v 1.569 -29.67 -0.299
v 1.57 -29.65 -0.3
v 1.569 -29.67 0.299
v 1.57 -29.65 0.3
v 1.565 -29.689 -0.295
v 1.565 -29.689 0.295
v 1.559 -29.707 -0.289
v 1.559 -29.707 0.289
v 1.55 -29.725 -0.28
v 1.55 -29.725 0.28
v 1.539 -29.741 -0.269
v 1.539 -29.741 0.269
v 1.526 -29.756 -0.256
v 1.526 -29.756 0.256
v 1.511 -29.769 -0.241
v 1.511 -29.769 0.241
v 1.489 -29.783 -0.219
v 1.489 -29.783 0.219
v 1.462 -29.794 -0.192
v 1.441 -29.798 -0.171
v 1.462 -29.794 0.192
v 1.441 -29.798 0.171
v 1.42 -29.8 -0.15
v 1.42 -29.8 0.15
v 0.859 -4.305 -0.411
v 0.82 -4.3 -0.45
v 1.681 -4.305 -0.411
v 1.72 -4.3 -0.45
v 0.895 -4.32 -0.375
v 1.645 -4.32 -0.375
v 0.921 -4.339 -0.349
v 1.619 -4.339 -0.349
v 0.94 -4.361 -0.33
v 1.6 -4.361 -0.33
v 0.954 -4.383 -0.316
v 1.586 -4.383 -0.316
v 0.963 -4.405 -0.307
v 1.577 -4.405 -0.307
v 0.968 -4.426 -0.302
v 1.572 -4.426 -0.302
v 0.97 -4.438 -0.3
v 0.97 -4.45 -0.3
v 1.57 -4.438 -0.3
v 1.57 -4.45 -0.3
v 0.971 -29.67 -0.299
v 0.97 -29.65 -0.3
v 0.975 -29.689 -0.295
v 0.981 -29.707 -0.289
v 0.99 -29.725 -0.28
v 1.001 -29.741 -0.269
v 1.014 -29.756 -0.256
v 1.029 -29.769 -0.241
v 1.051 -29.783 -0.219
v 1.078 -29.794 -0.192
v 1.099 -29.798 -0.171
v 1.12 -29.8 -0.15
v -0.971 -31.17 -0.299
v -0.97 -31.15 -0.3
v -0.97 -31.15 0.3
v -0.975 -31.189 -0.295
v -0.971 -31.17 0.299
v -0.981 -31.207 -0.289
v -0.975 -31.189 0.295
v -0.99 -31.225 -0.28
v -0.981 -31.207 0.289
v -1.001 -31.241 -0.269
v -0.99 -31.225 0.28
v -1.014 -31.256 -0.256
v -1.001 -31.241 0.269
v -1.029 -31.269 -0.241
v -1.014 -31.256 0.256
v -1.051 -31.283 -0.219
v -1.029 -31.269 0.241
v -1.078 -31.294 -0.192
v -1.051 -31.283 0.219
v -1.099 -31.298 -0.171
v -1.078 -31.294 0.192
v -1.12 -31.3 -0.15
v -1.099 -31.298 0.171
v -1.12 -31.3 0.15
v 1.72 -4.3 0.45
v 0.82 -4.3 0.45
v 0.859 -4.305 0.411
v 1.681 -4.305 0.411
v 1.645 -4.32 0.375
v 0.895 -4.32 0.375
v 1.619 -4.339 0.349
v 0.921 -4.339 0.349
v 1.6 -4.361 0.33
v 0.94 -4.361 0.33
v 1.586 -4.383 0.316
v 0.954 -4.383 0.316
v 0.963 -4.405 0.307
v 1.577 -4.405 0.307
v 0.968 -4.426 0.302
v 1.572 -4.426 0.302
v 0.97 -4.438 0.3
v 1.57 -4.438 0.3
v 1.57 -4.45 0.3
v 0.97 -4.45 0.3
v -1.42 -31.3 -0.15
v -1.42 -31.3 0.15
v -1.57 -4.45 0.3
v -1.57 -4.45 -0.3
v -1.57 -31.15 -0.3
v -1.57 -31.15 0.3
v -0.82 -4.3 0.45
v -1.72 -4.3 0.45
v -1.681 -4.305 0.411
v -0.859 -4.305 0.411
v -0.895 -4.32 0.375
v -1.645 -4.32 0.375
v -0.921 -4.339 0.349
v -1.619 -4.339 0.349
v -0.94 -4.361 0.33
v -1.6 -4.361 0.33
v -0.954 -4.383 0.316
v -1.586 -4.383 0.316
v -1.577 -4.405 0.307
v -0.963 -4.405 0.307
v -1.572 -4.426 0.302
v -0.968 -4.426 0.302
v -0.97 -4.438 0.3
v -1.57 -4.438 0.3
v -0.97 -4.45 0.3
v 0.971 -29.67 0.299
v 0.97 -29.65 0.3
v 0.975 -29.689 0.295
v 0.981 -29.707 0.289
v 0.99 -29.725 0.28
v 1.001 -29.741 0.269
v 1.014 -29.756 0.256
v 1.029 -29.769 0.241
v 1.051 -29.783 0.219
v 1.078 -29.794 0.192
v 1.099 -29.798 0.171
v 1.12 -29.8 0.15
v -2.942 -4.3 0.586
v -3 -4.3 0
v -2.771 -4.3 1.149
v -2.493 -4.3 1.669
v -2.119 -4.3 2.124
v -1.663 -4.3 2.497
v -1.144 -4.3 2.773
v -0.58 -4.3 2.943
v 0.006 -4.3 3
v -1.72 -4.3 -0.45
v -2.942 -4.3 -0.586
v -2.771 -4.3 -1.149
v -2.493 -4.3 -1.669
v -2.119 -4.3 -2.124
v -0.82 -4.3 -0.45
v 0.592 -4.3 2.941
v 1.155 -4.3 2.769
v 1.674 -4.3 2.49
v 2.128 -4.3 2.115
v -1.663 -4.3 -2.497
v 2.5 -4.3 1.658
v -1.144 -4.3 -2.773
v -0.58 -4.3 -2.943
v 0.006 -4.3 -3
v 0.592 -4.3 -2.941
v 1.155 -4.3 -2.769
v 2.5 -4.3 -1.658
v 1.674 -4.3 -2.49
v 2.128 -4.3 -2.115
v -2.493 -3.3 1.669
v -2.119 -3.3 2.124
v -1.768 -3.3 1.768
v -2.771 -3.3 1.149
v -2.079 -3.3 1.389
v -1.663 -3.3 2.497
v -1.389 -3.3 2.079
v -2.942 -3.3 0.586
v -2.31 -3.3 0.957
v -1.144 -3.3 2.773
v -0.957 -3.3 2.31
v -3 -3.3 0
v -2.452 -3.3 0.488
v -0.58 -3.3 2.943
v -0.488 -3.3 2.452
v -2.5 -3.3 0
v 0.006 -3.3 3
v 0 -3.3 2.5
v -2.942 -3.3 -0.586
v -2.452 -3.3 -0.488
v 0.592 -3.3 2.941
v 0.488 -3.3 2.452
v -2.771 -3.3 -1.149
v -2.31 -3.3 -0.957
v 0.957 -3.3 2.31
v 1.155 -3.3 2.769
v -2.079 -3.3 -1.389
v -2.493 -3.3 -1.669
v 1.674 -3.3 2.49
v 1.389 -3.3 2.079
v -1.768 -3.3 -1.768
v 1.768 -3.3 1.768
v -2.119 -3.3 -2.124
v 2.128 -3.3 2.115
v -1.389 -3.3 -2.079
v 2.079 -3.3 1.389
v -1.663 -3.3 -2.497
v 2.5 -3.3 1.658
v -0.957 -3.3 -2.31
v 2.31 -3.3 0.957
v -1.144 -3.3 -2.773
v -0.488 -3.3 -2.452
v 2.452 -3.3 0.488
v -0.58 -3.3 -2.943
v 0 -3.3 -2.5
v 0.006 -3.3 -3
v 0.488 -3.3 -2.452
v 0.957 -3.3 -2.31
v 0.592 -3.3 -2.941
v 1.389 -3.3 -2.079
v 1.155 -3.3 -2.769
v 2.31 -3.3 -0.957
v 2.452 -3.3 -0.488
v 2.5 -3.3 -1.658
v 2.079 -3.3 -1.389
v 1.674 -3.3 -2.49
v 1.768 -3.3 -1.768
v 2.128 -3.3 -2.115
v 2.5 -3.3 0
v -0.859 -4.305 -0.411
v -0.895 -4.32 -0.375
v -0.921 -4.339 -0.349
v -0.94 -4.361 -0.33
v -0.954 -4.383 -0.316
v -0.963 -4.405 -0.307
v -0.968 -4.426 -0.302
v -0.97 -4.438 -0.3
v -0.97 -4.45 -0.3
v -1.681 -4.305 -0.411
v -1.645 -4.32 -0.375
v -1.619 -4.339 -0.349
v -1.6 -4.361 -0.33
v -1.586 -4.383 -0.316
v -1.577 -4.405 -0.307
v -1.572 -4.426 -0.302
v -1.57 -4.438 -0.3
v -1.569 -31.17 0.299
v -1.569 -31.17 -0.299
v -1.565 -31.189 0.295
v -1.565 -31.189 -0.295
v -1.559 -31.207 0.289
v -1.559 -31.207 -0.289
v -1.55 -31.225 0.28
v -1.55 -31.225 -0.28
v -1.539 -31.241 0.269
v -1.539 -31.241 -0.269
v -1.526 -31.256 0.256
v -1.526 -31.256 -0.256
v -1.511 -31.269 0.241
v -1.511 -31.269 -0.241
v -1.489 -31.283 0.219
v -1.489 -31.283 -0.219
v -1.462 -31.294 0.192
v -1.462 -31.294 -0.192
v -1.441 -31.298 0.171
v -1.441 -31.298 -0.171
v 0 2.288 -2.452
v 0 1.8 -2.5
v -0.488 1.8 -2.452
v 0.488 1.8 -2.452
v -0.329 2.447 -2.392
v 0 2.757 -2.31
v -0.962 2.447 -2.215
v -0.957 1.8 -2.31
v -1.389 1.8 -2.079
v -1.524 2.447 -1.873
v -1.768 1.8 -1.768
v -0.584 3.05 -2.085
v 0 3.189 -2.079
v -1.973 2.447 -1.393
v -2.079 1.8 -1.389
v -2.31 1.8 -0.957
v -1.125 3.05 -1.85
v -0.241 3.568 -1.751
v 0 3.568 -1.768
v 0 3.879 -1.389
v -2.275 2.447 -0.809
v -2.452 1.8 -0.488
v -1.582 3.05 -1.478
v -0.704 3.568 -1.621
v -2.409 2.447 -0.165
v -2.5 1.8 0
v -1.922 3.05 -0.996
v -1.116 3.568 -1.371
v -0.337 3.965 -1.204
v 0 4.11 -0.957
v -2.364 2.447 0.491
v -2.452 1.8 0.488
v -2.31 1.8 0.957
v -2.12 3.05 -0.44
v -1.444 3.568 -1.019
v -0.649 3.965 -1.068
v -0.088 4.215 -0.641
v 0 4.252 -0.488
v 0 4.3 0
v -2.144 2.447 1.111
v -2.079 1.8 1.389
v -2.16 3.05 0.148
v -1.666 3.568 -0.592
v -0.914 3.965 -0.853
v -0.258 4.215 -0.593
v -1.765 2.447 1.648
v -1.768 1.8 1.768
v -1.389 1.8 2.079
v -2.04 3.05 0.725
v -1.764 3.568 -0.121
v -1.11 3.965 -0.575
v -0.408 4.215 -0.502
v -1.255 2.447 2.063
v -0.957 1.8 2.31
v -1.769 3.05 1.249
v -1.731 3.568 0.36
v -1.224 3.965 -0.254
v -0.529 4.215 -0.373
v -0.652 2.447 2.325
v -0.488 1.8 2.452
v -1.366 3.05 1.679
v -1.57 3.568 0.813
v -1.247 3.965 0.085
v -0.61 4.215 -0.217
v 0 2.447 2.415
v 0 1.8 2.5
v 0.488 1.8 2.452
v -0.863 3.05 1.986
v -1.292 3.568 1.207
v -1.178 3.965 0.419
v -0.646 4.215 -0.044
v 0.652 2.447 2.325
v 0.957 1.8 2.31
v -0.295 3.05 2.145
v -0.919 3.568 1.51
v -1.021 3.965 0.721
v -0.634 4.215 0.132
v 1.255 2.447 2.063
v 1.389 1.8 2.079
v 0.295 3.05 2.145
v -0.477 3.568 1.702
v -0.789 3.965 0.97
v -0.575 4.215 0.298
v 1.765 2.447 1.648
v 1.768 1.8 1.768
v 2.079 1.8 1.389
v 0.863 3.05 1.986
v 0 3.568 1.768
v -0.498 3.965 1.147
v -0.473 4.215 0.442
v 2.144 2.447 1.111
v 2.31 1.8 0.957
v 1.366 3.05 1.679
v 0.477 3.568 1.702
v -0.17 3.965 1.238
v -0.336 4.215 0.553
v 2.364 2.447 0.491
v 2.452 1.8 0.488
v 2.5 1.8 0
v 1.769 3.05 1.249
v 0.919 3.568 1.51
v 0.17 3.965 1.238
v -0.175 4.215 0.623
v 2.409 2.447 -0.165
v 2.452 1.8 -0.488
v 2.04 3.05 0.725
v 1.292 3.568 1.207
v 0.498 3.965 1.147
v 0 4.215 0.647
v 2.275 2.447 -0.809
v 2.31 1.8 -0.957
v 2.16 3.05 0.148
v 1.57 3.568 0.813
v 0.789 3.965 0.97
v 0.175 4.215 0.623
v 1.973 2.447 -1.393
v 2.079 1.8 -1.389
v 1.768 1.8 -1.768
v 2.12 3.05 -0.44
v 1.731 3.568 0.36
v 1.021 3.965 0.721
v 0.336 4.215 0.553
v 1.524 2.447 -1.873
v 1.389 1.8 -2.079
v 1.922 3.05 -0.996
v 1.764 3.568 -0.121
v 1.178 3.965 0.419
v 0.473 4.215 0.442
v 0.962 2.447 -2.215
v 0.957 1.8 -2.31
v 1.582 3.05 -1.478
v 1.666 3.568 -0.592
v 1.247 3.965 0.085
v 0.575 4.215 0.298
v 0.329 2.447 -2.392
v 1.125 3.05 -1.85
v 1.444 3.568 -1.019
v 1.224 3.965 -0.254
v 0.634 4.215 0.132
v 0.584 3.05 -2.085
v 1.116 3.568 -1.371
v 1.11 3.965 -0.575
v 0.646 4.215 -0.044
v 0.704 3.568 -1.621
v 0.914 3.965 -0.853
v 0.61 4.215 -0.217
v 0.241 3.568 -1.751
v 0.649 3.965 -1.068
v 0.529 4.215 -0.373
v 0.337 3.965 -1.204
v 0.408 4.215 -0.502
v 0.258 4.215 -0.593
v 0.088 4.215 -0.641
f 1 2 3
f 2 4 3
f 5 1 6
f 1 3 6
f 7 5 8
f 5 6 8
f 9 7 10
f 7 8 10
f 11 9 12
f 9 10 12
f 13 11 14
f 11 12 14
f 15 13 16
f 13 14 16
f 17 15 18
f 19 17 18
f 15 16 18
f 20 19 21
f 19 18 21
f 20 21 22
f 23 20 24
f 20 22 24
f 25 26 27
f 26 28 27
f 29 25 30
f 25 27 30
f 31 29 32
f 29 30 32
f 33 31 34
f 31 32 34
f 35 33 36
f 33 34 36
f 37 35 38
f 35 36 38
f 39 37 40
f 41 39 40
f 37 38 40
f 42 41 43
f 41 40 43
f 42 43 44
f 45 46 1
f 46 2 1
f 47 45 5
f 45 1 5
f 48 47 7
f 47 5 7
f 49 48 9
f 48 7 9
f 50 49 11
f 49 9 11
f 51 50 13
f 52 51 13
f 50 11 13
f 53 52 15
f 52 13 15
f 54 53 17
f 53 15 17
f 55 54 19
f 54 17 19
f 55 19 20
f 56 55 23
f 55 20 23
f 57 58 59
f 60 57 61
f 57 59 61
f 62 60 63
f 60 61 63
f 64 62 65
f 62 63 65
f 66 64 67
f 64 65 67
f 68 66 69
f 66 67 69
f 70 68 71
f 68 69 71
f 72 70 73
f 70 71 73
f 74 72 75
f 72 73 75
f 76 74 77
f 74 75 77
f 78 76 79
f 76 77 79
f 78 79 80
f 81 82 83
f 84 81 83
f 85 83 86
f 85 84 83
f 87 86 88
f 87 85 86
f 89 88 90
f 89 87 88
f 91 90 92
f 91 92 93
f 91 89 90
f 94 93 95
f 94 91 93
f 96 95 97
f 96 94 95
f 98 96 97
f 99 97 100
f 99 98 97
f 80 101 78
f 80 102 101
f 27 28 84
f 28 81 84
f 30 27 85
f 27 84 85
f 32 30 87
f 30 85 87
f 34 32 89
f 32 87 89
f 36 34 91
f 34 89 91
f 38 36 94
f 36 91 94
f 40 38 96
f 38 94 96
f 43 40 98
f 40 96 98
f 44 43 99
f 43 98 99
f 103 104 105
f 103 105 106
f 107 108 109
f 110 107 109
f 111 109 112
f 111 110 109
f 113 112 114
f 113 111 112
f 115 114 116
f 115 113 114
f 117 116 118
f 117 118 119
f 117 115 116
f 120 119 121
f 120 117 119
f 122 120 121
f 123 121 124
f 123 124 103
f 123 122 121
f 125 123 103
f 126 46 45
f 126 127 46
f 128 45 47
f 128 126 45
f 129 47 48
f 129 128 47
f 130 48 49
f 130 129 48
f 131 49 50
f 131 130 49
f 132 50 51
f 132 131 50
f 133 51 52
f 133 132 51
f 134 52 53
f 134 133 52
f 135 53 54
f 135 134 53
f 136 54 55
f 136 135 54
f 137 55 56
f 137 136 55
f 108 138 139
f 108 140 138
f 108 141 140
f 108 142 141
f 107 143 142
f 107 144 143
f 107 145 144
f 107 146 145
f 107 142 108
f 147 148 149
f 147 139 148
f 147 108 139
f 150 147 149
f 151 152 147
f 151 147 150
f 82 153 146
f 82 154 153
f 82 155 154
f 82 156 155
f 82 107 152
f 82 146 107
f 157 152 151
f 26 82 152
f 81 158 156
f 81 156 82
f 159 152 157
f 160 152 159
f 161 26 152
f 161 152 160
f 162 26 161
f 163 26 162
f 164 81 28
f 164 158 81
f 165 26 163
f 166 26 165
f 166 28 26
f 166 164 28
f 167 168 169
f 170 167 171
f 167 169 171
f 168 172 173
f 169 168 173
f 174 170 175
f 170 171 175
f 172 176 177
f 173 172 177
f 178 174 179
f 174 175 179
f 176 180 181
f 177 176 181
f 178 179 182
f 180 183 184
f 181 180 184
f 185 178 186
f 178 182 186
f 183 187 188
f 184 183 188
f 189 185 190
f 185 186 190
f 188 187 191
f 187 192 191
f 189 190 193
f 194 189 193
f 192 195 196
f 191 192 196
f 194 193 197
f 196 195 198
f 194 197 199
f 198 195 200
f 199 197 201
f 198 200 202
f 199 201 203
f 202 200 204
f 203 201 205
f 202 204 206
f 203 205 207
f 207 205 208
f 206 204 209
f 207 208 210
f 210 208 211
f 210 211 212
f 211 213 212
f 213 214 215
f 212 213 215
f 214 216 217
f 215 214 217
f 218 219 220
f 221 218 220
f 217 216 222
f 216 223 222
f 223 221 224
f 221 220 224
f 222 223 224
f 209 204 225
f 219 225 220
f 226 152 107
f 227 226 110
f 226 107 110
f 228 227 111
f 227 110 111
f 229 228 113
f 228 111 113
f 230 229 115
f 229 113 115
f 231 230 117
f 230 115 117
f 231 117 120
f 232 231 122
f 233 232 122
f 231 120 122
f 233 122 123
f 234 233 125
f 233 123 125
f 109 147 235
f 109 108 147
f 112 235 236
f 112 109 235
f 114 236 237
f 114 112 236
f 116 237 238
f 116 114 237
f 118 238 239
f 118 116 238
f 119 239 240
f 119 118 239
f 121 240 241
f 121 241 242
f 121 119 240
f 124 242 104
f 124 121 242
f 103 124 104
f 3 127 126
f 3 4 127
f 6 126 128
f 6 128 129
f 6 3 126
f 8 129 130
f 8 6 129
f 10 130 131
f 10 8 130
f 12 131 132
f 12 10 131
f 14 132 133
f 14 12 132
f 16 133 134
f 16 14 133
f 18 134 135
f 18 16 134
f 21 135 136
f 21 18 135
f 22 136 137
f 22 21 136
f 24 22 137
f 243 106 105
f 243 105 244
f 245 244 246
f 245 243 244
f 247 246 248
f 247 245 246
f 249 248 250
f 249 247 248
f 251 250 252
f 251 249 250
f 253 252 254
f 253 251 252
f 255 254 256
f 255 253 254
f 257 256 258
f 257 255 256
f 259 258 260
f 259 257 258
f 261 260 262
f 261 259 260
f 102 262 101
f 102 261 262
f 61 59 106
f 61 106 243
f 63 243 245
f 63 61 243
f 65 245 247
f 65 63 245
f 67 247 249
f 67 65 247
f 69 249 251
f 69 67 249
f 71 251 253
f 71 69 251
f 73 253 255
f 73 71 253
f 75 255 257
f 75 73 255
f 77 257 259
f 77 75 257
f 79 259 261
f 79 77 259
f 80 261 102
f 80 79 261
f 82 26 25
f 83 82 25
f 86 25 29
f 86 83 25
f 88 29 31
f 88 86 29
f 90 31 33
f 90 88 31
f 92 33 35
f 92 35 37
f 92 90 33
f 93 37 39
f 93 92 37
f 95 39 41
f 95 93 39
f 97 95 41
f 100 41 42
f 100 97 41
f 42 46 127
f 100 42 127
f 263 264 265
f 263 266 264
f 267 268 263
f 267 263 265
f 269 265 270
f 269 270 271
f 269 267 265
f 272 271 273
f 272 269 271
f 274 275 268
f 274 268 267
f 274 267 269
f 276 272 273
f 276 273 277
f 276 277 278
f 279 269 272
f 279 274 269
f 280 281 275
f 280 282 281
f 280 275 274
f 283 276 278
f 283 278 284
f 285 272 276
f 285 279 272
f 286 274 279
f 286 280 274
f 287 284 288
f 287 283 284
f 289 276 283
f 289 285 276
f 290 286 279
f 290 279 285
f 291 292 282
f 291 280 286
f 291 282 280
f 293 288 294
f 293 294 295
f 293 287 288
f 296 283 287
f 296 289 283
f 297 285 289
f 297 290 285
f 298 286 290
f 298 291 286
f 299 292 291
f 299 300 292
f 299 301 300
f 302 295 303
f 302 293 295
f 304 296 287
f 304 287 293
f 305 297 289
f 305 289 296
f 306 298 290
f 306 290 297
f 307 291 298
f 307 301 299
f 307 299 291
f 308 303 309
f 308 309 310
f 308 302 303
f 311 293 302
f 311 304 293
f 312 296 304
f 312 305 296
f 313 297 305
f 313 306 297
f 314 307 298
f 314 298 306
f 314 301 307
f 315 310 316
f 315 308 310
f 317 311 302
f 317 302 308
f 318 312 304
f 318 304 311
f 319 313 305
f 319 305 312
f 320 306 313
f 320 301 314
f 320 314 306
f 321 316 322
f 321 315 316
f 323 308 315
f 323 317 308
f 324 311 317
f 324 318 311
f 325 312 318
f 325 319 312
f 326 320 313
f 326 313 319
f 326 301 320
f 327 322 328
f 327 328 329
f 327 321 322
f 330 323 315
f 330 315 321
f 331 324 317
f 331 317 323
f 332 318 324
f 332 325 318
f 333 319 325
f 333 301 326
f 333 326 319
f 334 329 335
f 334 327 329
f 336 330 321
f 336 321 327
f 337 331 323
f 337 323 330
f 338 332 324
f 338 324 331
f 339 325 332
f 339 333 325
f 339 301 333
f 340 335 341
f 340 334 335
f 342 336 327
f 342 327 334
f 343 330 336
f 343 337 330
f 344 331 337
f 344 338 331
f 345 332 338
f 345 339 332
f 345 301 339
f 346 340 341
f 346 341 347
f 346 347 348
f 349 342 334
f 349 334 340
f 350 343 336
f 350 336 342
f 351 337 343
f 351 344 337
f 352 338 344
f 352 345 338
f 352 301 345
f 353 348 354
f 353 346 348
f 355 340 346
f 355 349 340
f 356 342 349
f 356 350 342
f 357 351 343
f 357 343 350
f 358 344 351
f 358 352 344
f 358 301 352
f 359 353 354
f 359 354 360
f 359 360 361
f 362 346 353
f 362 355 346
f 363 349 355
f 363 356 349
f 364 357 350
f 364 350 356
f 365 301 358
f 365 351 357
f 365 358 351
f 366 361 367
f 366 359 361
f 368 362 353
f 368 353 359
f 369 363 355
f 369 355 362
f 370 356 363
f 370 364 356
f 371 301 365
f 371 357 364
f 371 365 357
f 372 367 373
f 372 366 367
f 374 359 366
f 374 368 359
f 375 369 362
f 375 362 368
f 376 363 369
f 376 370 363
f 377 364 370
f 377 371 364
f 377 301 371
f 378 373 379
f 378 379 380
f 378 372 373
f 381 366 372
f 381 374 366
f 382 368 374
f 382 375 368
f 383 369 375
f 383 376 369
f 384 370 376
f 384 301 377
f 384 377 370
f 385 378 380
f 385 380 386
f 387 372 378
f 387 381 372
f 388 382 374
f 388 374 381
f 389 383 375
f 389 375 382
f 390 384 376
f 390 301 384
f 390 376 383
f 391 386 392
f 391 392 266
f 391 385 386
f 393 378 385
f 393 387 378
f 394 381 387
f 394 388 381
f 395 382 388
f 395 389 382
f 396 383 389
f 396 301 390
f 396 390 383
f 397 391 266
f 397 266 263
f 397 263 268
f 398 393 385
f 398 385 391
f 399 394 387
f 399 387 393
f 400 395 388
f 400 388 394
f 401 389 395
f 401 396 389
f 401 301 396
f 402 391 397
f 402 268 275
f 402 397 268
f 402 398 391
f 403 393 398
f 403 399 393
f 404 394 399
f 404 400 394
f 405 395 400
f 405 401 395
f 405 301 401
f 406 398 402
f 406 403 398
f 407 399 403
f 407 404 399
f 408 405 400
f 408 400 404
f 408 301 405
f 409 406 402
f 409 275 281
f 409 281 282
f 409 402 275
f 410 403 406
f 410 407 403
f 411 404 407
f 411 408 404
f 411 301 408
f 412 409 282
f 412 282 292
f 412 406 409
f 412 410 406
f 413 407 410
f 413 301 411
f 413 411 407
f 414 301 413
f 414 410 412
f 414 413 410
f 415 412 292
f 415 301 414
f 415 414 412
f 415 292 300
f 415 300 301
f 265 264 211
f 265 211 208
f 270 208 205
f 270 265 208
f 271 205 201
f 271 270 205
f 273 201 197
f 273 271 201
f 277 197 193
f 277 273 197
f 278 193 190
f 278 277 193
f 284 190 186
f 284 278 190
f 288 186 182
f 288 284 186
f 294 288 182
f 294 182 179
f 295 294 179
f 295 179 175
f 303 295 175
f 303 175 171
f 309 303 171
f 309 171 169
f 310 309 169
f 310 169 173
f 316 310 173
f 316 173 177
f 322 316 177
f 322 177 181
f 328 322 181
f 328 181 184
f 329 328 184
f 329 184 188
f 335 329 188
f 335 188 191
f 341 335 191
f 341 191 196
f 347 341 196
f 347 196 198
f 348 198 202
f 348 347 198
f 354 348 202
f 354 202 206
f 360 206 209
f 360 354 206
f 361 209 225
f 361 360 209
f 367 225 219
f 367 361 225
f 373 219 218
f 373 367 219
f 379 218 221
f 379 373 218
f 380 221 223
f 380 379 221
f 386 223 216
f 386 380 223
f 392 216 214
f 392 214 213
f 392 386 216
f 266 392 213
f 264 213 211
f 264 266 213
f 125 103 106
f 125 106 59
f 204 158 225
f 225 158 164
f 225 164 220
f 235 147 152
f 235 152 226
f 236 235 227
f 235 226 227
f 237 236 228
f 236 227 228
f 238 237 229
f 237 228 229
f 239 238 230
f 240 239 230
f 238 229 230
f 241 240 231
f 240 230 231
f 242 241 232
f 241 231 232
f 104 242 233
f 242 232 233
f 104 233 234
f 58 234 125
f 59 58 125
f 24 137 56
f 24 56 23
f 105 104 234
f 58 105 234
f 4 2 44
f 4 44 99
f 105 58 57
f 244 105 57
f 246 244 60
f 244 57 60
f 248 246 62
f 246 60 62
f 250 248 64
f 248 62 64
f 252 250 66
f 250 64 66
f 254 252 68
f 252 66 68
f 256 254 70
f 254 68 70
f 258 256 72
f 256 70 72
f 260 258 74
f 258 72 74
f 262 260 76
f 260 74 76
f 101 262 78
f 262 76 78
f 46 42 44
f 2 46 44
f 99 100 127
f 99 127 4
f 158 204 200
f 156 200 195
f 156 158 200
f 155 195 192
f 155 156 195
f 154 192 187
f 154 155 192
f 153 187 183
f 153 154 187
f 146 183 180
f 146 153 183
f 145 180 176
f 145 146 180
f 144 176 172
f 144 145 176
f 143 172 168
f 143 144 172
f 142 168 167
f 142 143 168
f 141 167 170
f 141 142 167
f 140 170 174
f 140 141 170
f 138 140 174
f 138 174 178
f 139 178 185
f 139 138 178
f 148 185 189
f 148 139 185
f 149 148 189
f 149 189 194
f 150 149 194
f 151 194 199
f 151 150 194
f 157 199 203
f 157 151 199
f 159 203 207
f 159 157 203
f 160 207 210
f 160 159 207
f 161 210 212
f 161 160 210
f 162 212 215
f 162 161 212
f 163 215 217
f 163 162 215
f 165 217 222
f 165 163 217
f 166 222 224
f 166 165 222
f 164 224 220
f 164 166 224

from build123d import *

# Parameters (mm, degrees)
SKETCH1_R               = 2.5
BOSS_EXTRUDE1_DEPTH     = 4.3
SKETCH2_R               = 3
BOSS_EXTRUDE2_DEPTH     = 1
FILLET1_R               = 2.5
CUT_EXTRUDE1_DEPTH      = 7.040695324
CUT_EXTRUDE1_DEPTH_BACK = 7.040695324
SKETCH3_W               = 0.954190985
SKETCH3_H               = 1.425570426
SKETCH4_W               = 0.6
SKETCH4_H               = 0.6
BOSS_EXTRUDE3_DEPTH     = 27
SKETCH4_3_W             = 0.6
SKETCH4_3_H             = 0.6
BOSS_EXTRUDE4_DEPTH     = 25.5
FILLET2_R               = 0.15
FILLET3_R               = 0.15
FILLET4_R               = 0.15
FILLET5_R               = 0.15


with BuildPart() as part:
    # Sketch1 → Boss-Extrude1 (new, symmetric)
    with BuildSketch(Plane(origin=(0, 0, 0), x_dir=(1, 0, 0), z_dir=(0, 1, 0))):
        Circle(SKETCH1_R)
    extrude(amount=BOSS_EXTRUDE1_DEPTH, both=True)

    # Sketch2 → Boss-Extrude2 (add)
    with BuildSketch(Plane.XZ.offset(4.3)):
        Circle(SKETCH2_R)
    extrude(amount=-BOSS_EXTRUDE2_DEPTH)

    # Fillet1
    fillet1_edges = [part.edges().sort_by_distance(p)[0] for p in [
        (-2.5, 4.3, 0),
    ]]
    fillet(fillet1_edges, radius=FILLET1_R)

    # Sketch3 → Cut-Extrude1 (cut, two sides: drawn at the far end of the back side and taken through both)
    with BuildSketch(Plane.XY.offset(-CUT_EXTRUDE1_DEPTH_BACK)):
        with Locations((2.977095493, -4.012785213)):
            Rectangle(SKETCH3_W, SKETCH3_H)
    extrude(amount=CUT_EXTRUDE1_DEPTH + CUT_EXTRUDE1_DEPTH_BACK, mode=Mode.SUBTRACT)

    # Sketch4 → Boss-Extrude3 (add)
    with BuildSketch(Plane.XZ.offset(4.3)):
        with Locations((-1.27, 0)):
            Rectangle(SKETCH4_W, SKETCH4_H)
    extrude(amount=BOSS_EXTRUDE3_DEPTH)

    # Sketch4<3> → Boss-Extrude4 (add)
    with BuildSketch(Plane.XZ.offset(4.3)):
        with Locations((1.27, 0)):
            Rectangle(SKETCH4_3_W, SKETCH4_3_H)
    extrude(amount=BOSS_EXTRUDE4_DEPTH)

    # Fillet2
    fillet2_edges = [part.edges().sort_by_distance(p)[0] for p in [
        (-1.57, -4.3, 0),
        (-1.27, -4.3, -0.3),
        (-0.97, -4.3, 0),
        (-1.27, -4.3, 0.3),
    ]]
    fillet(fillet2_edges, radius=FILLET2_R)

    # Fillet3
    fillet3_edges = [part.edges().sort_by_distance(p)[0] for p in [
        (1.27, -4.3, -0.3),
        (1.57, -4.3, 0),
        (0.97, -4.3, 0),
        (1.27, -4.3, 0.3),
    ]]
    fillet(fillet3_edges, radius=FILLET3_R)

    # Fillet4
    fillet4_edges = [part.edges().sort_by_distance(p)[0] for p in [
        (-1.57, -31.3, 0),
        (-1.27, -31.3, 0.3),
        (-0.97, -31.3, 0),
        (-1.27, -31.3, -0.3),
    ]]
    fillet(fillet4_edges, radius=FILLET4_R)

    # Fillet5
    fillet5_edges = [part.edges().sort_by_distance(p)[0] for p in [
        (1.27, -29.8, 0.3),
        (1.57, -29.8, 0),
        (1.27, -29.8, -0.3),
        (0.97, -29.8, 0),
    ]]
    fillet(fillet5_edges, radius=FILLET5_R)


solid = part.part
